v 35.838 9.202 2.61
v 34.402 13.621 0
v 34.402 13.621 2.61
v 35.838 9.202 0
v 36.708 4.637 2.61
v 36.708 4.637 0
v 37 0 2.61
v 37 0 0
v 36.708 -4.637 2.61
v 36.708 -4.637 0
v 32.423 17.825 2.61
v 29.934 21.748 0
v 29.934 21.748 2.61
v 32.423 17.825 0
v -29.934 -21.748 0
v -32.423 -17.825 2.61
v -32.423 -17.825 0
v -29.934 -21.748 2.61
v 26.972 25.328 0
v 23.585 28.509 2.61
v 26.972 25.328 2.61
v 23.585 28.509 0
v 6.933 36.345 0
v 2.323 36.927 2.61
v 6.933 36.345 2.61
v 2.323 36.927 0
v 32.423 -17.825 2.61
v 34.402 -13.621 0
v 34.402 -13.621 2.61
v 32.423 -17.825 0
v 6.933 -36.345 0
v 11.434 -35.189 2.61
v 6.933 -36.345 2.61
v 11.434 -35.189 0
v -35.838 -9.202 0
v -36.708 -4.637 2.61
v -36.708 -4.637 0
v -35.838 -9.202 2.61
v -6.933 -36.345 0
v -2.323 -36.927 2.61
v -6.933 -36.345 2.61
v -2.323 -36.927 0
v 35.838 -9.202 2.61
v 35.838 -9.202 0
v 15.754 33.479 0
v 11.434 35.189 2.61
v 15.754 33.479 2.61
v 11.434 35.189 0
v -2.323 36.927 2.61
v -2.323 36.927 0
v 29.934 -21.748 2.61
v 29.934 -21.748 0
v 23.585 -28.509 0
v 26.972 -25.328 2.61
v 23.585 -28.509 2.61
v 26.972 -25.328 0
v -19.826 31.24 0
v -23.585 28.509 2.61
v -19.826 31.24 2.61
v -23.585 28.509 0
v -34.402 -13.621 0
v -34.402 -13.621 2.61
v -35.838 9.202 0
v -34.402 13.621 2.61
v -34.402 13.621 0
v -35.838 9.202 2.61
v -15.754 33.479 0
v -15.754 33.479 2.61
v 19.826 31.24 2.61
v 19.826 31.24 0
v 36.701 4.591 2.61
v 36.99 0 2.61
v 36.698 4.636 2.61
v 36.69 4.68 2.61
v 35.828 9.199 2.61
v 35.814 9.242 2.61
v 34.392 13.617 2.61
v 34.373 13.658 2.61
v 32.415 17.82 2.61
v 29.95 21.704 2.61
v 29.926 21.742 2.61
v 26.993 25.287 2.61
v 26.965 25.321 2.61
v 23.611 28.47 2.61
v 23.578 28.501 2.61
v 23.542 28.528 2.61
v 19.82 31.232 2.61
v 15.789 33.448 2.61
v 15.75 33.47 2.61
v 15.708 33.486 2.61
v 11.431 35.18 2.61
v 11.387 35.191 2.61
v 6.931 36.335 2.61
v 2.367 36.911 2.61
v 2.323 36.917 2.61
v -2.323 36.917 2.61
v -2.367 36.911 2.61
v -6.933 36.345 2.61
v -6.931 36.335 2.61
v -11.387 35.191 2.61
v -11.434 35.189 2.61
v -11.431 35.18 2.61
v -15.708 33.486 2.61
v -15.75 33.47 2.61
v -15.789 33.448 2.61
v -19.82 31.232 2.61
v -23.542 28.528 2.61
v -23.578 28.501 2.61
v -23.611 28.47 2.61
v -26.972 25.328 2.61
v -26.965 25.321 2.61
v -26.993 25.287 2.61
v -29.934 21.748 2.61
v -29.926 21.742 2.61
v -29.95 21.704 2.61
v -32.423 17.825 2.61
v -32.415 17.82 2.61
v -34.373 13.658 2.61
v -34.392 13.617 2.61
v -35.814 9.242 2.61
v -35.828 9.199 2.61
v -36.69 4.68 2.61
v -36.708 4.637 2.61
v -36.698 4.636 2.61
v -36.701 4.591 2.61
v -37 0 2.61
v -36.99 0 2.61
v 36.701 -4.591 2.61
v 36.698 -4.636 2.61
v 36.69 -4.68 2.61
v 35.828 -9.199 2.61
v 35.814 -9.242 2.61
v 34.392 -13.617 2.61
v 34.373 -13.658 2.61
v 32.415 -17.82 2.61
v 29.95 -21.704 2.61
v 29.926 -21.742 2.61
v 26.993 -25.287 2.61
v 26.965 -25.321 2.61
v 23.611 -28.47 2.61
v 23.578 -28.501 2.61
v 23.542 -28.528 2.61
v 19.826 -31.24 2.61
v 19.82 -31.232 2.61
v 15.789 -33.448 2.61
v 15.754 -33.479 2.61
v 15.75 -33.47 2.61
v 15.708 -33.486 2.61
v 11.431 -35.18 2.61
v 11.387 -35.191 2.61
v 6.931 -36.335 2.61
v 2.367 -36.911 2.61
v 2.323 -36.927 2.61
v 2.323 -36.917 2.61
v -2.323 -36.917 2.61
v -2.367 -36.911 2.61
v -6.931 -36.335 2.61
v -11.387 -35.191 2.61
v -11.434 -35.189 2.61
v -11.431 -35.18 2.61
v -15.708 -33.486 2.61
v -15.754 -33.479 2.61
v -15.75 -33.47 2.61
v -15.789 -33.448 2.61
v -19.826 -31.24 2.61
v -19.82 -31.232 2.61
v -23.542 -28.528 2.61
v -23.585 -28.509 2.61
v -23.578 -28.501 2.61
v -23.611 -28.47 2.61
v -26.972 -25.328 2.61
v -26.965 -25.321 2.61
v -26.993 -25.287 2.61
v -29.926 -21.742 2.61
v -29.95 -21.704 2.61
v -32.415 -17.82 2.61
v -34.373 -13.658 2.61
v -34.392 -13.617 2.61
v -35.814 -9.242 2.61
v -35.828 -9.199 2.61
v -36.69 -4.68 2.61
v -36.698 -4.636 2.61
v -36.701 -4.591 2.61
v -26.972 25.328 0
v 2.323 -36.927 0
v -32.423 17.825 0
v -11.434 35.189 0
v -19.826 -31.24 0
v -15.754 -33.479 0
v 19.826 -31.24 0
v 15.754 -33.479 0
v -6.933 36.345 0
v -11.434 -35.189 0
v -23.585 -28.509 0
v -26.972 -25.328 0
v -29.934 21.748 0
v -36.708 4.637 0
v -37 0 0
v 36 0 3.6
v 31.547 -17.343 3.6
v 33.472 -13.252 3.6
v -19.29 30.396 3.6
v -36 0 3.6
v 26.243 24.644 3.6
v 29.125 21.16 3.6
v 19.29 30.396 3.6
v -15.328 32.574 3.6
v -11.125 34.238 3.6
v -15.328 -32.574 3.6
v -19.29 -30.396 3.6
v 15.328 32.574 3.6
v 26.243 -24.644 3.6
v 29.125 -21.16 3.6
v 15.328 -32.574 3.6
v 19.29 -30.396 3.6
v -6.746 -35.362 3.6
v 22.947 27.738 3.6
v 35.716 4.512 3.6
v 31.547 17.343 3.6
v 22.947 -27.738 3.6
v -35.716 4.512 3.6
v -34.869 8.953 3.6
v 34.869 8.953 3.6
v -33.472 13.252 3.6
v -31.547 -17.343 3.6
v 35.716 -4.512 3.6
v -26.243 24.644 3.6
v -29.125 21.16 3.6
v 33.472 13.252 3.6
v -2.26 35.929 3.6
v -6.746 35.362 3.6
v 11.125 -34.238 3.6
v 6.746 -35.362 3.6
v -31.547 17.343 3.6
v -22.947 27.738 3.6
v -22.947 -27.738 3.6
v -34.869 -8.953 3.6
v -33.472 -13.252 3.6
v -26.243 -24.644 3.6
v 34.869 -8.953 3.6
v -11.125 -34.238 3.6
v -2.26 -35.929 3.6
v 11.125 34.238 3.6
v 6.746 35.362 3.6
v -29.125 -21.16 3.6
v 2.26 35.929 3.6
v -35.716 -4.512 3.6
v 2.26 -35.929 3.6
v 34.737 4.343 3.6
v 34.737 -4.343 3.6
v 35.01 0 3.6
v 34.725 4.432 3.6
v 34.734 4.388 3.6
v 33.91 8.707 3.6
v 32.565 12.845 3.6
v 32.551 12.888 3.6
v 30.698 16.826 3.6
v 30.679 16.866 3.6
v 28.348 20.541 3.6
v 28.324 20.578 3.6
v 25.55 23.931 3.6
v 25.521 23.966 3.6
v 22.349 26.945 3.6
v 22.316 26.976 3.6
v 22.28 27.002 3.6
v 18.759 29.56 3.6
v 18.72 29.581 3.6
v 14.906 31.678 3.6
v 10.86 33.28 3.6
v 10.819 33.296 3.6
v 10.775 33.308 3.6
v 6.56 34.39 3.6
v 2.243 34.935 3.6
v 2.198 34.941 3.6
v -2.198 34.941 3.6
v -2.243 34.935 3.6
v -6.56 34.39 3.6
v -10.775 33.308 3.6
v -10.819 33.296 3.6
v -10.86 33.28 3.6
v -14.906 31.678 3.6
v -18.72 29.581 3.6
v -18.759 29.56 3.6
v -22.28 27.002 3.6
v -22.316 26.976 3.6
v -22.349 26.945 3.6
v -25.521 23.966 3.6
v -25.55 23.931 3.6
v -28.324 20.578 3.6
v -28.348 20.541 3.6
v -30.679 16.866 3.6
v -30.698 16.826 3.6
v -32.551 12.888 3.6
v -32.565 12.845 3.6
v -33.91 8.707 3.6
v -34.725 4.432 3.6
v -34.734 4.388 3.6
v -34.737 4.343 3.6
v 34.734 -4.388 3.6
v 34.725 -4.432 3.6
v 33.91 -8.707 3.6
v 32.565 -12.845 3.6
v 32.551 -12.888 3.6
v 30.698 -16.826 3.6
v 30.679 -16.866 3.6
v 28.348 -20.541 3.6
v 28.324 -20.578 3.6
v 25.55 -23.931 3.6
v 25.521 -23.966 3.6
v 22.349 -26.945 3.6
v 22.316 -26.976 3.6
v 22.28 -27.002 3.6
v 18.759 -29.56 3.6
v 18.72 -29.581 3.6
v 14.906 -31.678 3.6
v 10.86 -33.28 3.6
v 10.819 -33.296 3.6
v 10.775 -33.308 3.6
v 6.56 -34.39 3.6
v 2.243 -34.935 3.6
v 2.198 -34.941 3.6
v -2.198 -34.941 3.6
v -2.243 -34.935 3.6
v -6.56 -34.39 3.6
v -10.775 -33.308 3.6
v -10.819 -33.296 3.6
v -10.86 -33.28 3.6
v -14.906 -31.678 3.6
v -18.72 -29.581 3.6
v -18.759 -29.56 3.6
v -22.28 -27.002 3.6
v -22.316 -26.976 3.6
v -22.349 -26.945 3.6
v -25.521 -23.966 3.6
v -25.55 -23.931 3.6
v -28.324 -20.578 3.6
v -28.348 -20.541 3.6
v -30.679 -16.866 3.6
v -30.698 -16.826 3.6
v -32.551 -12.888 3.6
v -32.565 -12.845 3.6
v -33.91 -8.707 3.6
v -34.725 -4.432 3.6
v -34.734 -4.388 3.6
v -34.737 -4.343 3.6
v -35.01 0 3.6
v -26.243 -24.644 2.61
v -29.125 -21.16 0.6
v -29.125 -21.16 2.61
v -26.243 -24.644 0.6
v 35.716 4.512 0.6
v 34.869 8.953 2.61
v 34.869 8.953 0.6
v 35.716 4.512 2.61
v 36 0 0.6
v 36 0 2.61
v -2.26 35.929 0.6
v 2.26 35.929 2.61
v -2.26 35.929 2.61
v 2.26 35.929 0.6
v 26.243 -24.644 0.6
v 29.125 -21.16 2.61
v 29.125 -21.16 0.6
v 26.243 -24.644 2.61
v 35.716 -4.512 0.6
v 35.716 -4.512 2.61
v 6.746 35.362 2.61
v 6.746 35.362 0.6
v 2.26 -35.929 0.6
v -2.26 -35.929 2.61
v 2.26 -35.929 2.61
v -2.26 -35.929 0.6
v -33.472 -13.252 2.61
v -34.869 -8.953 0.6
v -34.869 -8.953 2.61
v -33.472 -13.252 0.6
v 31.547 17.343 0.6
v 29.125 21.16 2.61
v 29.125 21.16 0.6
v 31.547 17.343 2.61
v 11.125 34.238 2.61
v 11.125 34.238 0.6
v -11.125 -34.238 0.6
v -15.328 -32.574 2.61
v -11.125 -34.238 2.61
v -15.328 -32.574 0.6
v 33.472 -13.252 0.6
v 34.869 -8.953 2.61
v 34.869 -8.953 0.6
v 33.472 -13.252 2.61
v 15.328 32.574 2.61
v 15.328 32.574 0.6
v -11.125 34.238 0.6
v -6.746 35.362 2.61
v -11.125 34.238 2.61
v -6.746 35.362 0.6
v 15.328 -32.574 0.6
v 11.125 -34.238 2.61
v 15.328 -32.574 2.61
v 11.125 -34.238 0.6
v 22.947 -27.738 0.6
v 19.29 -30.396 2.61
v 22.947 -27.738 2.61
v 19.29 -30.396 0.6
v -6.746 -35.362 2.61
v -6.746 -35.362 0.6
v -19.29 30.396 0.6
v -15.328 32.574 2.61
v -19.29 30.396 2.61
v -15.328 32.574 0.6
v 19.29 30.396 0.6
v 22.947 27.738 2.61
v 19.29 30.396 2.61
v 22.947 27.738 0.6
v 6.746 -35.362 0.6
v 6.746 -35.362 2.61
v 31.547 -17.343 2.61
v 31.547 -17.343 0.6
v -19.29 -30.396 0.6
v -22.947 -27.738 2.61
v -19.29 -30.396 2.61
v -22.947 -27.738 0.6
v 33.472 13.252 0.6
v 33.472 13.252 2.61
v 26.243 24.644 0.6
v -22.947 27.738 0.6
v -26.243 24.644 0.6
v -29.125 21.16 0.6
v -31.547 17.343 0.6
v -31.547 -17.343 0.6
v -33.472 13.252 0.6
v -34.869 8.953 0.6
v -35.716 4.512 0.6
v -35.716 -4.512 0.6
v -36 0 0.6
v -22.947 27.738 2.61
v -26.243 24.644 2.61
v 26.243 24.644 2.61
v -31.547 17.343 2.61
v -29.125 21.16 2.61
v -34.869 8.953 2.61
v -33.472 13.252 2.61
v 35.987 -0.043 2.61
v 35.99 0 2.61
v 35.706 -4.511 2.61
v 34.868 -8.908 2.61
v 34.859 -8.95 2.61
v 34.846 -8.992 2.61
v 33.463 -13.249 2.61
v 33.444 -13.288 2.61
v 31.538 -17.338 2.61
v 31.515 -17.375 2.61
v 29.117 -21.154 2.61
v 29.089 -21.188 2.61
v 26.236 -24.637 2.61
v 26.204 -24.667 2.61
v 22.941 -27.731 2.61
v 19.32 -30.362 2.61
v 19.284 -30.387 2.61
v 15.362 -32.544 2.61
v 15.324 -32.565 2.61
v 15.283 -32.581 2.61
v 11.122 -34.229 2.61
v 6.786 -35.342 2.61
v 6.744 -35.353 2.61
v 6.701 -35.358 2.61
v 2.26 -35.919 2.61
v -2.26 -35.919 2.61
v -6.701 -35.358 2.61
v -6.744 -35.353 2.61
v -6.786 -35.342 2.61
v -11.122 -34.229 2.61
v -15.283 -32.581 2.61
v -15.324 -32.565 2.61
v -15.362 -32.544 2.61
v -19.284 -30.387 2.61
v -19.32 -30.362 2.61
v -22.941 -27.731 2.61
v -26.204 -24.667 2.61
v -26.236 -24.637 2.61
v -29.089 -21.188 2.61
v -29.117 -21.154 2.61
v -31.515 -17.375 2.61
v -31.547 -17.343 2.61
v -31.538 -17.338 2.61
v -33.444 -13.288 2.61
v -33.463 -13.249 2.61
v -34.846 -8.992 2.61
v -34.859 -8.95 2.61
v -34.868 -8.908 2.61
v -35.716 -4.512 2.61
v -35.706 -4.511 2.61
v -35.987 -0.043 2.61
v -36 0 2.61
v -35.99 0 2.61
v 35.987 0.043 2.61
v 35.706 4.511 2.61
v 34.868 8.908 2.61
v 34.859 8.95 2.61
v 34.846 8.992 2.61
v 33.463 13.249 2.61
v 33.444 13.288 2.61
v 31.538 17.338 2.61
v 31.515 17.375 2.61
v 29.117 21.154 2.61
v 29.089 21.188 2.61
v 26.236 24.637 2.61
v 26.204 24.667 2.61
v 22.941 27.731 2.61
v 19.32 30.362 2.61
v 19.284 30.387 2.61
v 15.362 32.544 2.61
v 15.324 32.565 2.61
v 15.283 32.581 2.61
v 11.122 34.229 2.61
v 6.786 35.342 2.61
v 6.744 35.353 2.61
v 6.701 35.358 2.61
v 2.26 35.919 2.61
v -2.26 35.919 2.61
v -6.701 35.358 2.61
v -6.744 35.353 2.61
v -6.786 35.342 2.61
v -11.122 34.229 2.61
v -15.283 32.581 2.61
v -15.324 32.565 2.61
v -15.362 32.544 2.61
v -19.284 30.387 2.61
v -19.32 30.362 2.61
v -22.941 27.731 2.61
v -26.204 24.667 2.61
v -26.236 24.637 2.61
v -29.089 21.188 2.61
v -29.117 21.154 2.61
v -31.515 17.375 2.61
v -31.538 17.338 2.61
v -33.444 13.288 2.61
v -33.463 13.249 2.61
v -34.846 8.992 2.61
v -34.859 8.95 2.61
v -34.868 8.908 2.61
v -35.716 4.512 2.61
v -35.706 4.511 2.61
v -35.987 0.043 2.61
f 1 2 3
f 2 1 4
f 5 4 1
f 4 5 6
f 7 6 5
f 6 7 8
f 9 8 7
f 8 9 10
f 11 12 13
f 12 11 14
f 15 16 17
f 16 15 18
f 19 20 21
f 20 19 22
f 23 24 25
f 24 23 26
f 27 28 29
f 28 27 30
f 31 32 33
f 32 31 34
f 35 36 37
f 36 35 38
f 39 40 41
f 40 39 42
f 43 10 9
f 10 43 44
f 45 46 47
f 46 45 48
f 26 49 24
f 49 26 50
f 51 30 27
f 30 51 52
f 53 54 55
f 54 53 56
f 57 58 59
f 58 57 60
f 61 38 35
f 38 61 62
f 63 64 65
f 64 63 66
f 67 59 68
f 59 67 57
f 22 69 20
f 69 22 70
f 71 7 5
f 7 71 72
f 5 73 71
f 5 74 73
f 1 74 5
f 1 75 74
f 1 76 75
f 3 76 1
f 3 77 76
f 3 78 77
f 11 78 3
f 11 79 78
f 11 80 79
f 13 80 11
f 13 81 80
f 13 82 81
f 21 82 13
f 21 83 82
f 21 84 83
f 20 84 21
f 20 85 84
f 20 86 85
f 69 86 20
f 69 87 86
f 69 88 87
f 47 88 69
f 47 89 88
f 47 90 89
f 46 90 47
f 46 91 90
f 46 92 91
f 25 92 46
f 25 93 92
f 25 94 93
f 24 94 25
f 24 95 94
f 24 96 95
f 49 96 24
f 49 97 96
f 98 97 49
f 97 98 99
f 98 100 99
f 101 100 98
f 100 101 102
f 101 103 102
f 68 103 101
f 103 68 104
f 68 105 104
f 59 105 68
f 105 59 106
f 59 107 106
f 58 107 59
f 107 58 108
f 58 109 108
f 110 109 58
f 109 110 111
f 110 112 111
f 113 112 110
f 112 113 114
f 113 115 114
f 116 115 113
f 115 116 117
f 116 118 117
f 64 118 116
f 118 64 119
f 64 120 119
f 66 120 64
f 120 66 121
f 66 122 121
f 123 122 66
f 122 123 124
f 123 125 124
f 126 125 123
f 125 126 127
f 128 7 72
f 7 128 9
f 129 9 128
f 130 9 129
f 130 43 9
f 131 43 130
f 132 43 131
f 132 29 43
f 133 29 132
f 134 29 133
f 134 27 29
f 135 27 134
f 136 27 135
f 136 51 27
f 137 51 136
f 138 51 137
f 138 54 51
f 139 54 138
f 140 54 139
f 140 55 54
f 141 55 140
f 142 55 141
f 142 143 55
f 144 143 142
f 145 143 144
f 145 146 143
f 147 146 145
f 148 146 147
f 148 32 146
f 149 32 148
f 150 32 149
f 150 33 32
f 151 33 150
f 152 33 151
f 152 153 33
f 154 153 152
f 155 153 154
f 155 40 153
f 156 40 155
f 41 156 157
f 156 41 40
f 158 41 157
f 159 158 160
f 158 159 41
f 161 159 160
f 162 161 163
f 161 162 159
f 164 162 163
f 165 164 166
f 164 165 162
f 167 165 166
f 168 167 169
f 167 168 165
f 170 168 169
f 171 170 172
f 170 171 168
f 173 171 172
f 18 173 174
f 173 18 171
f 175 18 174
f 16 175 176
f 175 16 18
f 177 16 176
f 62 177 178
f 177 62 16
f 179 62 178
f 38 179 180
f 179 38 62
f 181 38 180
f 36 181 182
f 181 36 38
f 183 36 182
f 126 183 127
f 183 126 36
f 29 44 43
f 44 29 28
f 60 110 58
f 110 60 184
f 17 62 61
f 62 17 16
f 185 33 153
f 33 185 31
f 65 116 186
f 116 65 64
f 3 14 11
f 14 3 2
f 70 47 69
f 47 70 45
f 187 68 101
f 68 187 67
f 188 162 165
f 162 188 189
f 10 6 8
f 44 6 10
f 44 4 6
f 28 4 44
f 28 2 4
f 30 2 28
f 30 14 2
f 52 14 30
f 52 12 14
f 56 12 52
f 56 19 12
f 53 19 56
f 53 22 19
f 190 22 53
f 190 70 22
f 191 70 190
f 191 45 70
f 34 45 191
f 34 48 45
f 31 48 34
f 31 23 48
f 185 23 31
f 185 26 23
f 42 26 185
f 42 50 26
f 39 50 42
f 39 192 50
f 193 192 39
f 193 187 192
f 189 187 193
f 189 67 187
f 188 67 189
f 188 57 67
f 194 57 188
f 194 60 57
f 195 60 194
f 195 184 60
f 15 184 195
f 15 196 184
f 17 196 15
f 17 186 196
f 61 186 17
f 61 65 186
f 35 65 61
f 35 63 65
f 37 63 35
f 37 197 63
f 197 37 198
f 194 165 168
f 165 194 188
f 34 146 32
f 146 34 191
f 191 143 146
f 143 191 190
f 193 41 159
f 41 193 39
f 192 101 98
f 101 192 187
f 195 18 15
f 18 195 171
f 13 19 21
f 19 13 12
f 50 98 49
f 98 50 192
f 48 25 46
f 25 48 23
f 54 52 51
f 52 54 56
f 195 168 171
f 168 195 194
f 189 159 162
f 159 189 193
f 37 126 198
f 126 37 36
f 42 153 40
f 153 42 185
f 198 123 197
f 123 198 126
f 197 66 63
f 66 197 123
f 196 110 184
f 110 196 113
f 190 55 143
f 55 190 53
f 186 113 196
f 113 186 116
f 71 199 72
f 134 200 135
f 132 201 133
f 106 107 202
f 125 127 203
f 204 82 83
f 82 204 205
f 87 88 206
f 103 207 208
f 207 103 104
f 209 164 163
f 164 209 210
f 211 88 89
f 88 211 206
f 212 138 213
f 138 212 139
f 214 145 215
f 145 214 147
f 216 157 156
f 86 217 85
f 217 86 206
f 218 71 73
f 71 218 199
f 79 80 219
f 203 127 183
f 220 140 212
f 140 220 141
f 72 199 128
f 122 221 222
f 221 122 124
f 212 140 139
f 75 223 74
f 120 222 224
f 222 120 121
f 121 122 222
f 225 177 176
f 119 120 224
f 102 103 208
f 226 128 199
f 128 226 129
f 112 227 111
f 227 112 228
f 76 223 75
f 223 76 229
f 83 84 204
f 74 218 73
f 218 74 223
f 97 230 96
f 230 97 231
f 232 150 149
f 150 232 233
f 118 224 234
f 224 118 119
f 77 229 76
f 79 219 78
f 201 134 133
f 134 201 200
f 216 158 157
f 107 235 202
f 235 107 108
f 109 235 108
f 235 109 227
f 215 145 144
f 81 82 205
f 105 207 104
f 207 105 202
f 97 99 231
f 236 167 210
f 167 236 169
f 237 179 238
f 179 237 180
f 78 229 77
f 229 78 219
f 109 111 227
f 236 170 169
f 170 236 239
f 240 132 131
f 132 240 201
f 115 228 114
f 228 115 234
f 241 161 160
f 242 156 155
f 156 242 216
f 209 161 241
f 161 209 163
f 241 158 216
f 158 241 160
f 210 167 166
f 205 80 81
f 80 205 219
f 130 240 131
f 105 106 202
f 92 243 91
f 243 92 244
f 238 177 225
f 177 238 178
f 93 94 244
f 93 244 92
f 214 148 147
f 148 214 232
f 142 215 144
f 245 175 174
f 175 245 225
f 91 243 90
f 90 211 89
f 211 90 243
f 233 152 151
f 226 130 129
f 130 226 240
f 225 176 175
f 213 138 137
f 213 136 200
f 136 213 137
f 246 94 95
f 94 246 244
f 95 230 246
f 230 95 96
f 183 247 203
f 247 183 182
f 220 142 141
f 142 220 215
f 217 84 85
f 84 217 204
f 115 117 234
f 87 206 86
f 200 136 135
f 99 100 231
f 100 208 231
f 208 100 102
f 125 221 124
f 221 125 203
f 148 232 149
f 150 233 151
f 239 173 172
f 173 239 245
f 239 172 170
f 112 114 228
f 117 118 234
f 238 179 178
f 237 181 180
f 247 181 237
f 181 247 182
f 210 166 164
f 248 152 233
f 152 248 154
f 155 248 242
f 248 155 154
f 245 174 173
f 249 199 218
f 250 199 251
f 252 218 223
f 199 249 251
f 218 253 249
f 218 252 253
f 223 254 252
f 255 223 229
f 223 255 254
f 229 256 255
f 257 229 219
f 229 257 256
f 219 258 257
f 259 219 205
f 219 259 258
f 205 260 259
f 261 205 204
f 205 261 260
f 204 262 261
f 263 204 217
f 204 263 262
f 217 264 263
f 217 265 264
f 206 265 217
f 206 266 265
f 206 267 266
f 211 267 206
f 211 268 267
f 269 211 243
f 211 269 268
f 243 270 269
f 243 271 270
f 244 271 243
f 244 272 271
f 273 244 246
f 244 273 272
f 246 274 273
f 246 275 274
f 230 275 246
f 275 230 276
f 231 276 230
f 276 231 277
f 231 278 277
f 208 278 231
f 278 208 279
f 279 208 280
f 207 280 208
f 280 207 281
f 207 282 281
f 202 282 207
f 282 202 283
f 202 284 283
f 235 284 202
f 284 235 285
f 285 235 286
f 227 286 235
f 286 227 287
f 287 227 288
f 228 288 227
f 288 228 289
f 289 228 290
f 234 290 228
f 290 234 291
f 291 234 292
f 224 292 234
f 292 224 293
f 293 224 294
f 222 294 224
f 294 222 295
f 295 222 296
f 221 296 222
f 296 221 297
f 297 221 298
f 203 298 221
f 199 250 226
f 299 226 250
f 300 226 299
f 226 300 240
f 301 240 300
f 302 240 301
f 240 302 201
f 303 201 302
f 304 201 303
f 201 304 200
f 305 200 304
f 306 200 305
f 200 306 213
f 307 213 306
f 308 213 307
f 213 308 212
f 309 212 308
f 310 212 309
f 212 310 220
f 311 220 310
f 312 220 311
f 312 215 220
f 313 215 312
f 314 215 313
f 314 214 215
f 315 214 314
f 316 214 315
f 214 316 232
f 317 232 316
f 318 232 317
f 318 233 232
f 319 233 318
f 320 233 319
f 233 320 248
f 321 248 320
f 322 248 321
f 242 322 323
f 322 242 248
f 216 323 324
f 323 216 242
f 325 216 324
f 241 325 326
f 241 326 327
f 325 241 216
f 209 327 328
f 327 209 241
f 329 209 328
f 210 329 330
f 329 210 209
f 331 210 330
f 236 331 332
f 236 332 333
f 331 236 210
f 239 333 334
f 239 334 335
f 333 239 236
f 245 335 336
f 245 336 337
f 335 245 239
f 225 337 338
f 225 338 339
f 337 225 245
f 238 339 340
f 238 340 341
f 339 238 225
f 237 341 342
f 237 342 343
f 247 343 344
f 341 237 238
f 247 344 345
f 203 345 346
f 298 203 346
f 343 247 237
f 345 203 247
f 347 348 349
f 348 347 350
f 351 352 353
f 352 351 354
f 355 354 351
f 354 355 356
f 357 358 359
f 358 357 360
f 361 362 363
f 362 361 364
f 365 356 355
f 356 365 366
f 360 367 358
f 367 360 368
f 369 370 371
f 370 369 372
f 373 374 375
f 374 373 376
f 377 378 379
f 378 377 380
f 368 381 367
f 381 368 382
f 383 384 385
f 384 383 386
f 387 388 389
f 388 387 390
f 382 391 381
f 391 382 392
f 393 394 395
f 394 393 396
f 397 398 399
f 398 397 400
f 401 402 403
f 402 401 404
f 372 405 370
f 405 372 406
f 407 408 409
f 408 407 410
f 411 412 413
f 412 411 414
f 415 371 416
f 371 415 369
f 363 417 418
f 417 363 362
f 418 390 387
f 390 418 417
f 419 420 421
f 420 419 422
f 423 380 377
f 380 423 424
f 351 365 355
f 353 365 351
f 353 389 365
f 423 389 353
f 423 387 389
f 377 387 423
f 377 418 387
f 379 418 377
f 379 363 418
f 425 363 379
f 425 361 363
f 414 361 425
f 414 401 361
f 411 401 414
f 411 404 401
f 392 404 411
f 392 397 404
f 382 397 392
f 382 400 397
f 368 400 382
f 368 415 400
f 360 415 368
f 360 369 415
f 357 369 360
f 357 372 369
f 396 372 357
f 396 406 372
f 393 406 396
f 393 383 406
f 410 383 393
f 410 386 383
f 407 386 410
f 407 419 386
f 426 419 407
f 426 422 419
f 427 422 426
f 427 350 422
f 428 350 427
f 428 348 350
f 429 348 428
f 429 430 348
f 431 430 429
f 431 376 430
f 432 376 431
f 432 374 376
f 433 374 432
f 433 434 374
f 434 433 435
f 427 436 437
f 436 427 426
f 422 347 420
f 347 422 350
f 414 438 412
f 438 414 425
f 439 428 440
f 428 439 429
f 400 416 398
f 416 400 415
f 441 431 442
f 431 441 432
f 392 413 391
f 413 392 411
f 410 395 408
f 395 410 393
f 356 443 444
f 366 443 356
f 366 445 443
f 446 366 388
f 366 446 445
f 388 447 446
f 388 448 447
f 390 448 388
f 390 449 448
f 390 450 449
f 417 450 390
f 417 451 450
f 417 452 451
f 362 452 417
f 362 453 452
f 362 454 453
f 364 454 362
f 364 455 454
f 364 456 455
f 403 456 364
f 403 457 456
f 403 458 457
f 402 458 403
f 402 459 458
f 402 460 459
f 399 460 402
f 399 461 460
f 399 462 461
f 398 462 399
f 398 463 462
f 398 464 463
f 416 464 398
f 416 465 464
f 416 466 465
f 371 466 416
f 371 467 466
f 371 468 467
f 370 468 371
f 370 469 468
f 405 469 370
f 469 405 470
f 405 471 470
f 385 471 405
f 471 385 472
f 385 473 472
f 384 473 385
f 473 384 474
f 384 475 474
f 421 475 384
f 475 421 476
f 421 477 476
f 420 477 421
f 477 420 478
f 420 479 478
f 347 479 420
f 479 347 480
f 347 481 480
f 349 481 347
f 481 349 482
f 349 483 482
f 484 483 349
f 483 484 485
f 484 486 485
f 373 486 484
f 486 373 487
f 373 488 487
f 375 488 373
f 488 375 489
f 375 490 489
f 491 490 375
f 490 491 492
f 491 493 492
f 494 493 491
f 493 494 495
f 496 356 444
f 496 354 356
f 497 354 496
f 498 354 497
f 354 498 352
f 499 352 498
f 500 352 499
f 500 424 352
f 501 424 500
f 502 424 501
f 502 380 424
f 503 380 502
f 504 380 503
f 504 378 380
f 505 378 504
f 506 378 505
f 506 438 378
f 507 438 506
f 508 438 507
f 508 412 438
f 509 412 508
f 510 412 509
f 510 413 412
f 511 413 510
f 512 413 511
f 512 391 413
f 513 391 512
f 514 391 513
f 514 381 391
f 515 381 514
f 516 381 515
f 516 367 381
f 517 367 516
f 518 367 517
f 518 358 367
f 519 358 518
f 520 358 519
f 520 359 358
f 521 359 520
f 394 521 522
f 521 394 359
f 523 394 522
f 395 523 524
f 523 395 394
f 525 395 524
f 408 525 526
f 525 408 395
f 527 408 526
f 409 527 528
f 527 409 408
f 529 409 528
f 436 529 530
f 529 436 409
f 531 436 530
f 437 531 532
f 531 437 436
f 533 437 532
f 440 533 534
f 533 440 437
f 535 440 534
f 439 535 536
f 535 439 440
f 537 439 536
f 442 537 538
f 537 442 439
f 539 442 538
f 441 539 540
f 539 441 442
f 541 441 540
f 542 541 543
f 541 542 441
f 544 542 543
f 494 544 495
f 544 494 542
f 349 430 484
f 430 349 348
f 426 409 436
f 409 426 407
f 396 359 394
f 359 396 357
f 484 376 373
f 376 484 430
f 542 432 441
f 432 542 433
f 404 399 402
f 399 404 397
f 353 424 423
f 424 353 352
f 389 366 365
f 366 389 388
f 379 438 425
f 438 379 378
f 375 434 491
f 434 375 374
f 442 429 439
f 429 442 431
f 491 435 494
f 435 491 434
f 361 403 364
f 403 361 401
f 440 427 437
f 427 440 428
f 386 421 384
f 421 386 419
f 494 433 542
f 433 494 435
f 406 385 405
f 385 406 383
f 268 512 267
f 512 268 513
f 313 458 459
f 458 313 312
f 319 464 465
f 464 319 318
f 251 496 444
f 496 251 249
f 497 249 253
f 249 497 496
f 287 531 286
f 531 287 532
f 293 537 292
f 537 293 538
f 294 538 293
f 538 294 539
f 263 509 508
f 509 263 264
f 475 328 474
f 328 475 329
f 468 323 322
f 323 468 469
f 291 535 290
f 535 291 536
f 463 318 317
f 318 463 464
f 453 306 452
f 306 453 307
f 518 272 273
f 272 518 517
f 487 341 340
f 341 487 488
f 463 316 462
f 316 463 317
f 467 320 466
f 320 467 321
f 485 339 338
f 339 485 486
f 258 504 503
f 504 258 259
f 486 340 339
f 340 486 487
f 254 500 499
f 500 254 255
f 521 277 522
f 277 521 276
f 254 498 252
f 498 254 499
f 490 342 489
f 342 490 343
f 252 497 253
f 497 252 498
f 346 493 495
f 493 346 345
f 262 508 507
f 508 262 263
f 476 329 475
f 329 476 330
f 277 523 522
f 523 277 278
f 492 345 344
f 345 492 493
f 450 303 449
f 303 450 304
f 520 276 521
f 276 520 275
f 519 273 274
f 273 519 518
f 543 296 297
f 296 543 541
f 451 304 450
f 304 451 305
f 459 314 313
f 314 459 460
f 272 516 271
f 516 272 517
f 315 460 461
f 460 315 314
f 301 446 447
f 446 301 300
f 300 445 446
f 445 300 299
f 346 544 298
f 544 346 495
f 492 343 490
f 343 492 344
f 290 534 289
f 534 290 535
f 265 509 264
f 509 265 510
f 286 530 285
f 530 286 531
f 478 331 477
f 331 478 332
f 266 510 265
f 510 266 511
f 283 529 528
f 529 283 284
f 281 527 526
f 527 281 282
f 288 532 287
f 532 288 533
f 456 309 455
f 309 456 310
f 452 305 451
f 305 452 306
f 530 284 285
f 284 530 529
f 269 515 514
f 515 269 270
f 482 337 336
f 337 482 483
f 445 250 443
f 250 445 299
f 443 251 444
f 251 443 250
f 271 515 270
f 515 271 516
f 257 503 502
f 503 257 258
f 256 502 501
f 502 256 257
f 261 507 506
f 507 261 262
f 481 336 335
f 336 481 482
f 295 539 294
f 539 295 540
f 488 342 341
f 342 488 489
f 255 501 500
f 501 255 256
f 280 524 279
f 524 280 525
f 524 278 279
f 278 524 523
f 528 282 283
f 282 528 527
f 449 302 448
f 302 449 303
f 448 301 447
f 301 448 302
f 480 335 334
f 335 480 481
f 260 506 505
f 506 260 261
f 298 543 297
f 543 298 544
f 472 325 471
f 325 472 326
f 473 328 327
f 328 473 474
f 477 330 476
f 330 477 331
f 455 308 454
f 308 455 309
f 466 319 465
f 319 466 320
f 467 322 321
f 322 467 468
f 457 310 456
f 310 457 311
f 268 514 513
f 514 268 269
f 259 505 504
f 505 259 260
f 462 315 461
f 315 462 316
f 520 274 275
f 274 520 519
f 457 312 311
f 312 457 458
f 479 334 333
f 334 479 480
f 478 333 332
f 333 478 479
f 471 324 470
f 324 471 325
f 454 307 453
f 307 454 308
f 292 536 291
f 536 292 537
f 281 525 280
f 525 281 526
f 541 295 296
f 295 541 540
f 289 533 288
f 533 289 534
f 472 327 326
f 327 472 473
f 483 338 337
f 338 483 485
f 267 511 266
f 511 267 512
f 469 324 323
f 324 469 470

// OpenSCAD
//Total diameter of the cup including the lip
cup_diameter = 72;	

//The thickness of the cup lip.
lip_height = 2;

//The thickness of the printed lid.		
lid_thickness = 0.6;	

/* [Hidden] */

$fn=50;

cup_radius = cup_diameter / 2;
difference()
{
	union()
	{
	
		cylinder(h = lip_height + lid_thickness + 0.01, r1 = cup_radius + 1, r2 = cup_radius + 1, center = false);
		
		translate ([0,0,lip_height + lid_thickness])
		{
			cylinder(h = 1, r1 = cup_radius + 1, r2 = cup_radius, center = false);
		}
	}

	union()
	{
		translate ([0,0,lid_thickness])
		{
			cylinder(h = lip_height+0.01, r1 = cup_radius, r2 = cup_radius, center = false);
		}
		translate ([0,0,lid_thickness + lip_height])
		{
			cylinder(h = 1.01, r1 = cup_radius, r2 = cup_radius-1, center = false);
		}
	}
}
